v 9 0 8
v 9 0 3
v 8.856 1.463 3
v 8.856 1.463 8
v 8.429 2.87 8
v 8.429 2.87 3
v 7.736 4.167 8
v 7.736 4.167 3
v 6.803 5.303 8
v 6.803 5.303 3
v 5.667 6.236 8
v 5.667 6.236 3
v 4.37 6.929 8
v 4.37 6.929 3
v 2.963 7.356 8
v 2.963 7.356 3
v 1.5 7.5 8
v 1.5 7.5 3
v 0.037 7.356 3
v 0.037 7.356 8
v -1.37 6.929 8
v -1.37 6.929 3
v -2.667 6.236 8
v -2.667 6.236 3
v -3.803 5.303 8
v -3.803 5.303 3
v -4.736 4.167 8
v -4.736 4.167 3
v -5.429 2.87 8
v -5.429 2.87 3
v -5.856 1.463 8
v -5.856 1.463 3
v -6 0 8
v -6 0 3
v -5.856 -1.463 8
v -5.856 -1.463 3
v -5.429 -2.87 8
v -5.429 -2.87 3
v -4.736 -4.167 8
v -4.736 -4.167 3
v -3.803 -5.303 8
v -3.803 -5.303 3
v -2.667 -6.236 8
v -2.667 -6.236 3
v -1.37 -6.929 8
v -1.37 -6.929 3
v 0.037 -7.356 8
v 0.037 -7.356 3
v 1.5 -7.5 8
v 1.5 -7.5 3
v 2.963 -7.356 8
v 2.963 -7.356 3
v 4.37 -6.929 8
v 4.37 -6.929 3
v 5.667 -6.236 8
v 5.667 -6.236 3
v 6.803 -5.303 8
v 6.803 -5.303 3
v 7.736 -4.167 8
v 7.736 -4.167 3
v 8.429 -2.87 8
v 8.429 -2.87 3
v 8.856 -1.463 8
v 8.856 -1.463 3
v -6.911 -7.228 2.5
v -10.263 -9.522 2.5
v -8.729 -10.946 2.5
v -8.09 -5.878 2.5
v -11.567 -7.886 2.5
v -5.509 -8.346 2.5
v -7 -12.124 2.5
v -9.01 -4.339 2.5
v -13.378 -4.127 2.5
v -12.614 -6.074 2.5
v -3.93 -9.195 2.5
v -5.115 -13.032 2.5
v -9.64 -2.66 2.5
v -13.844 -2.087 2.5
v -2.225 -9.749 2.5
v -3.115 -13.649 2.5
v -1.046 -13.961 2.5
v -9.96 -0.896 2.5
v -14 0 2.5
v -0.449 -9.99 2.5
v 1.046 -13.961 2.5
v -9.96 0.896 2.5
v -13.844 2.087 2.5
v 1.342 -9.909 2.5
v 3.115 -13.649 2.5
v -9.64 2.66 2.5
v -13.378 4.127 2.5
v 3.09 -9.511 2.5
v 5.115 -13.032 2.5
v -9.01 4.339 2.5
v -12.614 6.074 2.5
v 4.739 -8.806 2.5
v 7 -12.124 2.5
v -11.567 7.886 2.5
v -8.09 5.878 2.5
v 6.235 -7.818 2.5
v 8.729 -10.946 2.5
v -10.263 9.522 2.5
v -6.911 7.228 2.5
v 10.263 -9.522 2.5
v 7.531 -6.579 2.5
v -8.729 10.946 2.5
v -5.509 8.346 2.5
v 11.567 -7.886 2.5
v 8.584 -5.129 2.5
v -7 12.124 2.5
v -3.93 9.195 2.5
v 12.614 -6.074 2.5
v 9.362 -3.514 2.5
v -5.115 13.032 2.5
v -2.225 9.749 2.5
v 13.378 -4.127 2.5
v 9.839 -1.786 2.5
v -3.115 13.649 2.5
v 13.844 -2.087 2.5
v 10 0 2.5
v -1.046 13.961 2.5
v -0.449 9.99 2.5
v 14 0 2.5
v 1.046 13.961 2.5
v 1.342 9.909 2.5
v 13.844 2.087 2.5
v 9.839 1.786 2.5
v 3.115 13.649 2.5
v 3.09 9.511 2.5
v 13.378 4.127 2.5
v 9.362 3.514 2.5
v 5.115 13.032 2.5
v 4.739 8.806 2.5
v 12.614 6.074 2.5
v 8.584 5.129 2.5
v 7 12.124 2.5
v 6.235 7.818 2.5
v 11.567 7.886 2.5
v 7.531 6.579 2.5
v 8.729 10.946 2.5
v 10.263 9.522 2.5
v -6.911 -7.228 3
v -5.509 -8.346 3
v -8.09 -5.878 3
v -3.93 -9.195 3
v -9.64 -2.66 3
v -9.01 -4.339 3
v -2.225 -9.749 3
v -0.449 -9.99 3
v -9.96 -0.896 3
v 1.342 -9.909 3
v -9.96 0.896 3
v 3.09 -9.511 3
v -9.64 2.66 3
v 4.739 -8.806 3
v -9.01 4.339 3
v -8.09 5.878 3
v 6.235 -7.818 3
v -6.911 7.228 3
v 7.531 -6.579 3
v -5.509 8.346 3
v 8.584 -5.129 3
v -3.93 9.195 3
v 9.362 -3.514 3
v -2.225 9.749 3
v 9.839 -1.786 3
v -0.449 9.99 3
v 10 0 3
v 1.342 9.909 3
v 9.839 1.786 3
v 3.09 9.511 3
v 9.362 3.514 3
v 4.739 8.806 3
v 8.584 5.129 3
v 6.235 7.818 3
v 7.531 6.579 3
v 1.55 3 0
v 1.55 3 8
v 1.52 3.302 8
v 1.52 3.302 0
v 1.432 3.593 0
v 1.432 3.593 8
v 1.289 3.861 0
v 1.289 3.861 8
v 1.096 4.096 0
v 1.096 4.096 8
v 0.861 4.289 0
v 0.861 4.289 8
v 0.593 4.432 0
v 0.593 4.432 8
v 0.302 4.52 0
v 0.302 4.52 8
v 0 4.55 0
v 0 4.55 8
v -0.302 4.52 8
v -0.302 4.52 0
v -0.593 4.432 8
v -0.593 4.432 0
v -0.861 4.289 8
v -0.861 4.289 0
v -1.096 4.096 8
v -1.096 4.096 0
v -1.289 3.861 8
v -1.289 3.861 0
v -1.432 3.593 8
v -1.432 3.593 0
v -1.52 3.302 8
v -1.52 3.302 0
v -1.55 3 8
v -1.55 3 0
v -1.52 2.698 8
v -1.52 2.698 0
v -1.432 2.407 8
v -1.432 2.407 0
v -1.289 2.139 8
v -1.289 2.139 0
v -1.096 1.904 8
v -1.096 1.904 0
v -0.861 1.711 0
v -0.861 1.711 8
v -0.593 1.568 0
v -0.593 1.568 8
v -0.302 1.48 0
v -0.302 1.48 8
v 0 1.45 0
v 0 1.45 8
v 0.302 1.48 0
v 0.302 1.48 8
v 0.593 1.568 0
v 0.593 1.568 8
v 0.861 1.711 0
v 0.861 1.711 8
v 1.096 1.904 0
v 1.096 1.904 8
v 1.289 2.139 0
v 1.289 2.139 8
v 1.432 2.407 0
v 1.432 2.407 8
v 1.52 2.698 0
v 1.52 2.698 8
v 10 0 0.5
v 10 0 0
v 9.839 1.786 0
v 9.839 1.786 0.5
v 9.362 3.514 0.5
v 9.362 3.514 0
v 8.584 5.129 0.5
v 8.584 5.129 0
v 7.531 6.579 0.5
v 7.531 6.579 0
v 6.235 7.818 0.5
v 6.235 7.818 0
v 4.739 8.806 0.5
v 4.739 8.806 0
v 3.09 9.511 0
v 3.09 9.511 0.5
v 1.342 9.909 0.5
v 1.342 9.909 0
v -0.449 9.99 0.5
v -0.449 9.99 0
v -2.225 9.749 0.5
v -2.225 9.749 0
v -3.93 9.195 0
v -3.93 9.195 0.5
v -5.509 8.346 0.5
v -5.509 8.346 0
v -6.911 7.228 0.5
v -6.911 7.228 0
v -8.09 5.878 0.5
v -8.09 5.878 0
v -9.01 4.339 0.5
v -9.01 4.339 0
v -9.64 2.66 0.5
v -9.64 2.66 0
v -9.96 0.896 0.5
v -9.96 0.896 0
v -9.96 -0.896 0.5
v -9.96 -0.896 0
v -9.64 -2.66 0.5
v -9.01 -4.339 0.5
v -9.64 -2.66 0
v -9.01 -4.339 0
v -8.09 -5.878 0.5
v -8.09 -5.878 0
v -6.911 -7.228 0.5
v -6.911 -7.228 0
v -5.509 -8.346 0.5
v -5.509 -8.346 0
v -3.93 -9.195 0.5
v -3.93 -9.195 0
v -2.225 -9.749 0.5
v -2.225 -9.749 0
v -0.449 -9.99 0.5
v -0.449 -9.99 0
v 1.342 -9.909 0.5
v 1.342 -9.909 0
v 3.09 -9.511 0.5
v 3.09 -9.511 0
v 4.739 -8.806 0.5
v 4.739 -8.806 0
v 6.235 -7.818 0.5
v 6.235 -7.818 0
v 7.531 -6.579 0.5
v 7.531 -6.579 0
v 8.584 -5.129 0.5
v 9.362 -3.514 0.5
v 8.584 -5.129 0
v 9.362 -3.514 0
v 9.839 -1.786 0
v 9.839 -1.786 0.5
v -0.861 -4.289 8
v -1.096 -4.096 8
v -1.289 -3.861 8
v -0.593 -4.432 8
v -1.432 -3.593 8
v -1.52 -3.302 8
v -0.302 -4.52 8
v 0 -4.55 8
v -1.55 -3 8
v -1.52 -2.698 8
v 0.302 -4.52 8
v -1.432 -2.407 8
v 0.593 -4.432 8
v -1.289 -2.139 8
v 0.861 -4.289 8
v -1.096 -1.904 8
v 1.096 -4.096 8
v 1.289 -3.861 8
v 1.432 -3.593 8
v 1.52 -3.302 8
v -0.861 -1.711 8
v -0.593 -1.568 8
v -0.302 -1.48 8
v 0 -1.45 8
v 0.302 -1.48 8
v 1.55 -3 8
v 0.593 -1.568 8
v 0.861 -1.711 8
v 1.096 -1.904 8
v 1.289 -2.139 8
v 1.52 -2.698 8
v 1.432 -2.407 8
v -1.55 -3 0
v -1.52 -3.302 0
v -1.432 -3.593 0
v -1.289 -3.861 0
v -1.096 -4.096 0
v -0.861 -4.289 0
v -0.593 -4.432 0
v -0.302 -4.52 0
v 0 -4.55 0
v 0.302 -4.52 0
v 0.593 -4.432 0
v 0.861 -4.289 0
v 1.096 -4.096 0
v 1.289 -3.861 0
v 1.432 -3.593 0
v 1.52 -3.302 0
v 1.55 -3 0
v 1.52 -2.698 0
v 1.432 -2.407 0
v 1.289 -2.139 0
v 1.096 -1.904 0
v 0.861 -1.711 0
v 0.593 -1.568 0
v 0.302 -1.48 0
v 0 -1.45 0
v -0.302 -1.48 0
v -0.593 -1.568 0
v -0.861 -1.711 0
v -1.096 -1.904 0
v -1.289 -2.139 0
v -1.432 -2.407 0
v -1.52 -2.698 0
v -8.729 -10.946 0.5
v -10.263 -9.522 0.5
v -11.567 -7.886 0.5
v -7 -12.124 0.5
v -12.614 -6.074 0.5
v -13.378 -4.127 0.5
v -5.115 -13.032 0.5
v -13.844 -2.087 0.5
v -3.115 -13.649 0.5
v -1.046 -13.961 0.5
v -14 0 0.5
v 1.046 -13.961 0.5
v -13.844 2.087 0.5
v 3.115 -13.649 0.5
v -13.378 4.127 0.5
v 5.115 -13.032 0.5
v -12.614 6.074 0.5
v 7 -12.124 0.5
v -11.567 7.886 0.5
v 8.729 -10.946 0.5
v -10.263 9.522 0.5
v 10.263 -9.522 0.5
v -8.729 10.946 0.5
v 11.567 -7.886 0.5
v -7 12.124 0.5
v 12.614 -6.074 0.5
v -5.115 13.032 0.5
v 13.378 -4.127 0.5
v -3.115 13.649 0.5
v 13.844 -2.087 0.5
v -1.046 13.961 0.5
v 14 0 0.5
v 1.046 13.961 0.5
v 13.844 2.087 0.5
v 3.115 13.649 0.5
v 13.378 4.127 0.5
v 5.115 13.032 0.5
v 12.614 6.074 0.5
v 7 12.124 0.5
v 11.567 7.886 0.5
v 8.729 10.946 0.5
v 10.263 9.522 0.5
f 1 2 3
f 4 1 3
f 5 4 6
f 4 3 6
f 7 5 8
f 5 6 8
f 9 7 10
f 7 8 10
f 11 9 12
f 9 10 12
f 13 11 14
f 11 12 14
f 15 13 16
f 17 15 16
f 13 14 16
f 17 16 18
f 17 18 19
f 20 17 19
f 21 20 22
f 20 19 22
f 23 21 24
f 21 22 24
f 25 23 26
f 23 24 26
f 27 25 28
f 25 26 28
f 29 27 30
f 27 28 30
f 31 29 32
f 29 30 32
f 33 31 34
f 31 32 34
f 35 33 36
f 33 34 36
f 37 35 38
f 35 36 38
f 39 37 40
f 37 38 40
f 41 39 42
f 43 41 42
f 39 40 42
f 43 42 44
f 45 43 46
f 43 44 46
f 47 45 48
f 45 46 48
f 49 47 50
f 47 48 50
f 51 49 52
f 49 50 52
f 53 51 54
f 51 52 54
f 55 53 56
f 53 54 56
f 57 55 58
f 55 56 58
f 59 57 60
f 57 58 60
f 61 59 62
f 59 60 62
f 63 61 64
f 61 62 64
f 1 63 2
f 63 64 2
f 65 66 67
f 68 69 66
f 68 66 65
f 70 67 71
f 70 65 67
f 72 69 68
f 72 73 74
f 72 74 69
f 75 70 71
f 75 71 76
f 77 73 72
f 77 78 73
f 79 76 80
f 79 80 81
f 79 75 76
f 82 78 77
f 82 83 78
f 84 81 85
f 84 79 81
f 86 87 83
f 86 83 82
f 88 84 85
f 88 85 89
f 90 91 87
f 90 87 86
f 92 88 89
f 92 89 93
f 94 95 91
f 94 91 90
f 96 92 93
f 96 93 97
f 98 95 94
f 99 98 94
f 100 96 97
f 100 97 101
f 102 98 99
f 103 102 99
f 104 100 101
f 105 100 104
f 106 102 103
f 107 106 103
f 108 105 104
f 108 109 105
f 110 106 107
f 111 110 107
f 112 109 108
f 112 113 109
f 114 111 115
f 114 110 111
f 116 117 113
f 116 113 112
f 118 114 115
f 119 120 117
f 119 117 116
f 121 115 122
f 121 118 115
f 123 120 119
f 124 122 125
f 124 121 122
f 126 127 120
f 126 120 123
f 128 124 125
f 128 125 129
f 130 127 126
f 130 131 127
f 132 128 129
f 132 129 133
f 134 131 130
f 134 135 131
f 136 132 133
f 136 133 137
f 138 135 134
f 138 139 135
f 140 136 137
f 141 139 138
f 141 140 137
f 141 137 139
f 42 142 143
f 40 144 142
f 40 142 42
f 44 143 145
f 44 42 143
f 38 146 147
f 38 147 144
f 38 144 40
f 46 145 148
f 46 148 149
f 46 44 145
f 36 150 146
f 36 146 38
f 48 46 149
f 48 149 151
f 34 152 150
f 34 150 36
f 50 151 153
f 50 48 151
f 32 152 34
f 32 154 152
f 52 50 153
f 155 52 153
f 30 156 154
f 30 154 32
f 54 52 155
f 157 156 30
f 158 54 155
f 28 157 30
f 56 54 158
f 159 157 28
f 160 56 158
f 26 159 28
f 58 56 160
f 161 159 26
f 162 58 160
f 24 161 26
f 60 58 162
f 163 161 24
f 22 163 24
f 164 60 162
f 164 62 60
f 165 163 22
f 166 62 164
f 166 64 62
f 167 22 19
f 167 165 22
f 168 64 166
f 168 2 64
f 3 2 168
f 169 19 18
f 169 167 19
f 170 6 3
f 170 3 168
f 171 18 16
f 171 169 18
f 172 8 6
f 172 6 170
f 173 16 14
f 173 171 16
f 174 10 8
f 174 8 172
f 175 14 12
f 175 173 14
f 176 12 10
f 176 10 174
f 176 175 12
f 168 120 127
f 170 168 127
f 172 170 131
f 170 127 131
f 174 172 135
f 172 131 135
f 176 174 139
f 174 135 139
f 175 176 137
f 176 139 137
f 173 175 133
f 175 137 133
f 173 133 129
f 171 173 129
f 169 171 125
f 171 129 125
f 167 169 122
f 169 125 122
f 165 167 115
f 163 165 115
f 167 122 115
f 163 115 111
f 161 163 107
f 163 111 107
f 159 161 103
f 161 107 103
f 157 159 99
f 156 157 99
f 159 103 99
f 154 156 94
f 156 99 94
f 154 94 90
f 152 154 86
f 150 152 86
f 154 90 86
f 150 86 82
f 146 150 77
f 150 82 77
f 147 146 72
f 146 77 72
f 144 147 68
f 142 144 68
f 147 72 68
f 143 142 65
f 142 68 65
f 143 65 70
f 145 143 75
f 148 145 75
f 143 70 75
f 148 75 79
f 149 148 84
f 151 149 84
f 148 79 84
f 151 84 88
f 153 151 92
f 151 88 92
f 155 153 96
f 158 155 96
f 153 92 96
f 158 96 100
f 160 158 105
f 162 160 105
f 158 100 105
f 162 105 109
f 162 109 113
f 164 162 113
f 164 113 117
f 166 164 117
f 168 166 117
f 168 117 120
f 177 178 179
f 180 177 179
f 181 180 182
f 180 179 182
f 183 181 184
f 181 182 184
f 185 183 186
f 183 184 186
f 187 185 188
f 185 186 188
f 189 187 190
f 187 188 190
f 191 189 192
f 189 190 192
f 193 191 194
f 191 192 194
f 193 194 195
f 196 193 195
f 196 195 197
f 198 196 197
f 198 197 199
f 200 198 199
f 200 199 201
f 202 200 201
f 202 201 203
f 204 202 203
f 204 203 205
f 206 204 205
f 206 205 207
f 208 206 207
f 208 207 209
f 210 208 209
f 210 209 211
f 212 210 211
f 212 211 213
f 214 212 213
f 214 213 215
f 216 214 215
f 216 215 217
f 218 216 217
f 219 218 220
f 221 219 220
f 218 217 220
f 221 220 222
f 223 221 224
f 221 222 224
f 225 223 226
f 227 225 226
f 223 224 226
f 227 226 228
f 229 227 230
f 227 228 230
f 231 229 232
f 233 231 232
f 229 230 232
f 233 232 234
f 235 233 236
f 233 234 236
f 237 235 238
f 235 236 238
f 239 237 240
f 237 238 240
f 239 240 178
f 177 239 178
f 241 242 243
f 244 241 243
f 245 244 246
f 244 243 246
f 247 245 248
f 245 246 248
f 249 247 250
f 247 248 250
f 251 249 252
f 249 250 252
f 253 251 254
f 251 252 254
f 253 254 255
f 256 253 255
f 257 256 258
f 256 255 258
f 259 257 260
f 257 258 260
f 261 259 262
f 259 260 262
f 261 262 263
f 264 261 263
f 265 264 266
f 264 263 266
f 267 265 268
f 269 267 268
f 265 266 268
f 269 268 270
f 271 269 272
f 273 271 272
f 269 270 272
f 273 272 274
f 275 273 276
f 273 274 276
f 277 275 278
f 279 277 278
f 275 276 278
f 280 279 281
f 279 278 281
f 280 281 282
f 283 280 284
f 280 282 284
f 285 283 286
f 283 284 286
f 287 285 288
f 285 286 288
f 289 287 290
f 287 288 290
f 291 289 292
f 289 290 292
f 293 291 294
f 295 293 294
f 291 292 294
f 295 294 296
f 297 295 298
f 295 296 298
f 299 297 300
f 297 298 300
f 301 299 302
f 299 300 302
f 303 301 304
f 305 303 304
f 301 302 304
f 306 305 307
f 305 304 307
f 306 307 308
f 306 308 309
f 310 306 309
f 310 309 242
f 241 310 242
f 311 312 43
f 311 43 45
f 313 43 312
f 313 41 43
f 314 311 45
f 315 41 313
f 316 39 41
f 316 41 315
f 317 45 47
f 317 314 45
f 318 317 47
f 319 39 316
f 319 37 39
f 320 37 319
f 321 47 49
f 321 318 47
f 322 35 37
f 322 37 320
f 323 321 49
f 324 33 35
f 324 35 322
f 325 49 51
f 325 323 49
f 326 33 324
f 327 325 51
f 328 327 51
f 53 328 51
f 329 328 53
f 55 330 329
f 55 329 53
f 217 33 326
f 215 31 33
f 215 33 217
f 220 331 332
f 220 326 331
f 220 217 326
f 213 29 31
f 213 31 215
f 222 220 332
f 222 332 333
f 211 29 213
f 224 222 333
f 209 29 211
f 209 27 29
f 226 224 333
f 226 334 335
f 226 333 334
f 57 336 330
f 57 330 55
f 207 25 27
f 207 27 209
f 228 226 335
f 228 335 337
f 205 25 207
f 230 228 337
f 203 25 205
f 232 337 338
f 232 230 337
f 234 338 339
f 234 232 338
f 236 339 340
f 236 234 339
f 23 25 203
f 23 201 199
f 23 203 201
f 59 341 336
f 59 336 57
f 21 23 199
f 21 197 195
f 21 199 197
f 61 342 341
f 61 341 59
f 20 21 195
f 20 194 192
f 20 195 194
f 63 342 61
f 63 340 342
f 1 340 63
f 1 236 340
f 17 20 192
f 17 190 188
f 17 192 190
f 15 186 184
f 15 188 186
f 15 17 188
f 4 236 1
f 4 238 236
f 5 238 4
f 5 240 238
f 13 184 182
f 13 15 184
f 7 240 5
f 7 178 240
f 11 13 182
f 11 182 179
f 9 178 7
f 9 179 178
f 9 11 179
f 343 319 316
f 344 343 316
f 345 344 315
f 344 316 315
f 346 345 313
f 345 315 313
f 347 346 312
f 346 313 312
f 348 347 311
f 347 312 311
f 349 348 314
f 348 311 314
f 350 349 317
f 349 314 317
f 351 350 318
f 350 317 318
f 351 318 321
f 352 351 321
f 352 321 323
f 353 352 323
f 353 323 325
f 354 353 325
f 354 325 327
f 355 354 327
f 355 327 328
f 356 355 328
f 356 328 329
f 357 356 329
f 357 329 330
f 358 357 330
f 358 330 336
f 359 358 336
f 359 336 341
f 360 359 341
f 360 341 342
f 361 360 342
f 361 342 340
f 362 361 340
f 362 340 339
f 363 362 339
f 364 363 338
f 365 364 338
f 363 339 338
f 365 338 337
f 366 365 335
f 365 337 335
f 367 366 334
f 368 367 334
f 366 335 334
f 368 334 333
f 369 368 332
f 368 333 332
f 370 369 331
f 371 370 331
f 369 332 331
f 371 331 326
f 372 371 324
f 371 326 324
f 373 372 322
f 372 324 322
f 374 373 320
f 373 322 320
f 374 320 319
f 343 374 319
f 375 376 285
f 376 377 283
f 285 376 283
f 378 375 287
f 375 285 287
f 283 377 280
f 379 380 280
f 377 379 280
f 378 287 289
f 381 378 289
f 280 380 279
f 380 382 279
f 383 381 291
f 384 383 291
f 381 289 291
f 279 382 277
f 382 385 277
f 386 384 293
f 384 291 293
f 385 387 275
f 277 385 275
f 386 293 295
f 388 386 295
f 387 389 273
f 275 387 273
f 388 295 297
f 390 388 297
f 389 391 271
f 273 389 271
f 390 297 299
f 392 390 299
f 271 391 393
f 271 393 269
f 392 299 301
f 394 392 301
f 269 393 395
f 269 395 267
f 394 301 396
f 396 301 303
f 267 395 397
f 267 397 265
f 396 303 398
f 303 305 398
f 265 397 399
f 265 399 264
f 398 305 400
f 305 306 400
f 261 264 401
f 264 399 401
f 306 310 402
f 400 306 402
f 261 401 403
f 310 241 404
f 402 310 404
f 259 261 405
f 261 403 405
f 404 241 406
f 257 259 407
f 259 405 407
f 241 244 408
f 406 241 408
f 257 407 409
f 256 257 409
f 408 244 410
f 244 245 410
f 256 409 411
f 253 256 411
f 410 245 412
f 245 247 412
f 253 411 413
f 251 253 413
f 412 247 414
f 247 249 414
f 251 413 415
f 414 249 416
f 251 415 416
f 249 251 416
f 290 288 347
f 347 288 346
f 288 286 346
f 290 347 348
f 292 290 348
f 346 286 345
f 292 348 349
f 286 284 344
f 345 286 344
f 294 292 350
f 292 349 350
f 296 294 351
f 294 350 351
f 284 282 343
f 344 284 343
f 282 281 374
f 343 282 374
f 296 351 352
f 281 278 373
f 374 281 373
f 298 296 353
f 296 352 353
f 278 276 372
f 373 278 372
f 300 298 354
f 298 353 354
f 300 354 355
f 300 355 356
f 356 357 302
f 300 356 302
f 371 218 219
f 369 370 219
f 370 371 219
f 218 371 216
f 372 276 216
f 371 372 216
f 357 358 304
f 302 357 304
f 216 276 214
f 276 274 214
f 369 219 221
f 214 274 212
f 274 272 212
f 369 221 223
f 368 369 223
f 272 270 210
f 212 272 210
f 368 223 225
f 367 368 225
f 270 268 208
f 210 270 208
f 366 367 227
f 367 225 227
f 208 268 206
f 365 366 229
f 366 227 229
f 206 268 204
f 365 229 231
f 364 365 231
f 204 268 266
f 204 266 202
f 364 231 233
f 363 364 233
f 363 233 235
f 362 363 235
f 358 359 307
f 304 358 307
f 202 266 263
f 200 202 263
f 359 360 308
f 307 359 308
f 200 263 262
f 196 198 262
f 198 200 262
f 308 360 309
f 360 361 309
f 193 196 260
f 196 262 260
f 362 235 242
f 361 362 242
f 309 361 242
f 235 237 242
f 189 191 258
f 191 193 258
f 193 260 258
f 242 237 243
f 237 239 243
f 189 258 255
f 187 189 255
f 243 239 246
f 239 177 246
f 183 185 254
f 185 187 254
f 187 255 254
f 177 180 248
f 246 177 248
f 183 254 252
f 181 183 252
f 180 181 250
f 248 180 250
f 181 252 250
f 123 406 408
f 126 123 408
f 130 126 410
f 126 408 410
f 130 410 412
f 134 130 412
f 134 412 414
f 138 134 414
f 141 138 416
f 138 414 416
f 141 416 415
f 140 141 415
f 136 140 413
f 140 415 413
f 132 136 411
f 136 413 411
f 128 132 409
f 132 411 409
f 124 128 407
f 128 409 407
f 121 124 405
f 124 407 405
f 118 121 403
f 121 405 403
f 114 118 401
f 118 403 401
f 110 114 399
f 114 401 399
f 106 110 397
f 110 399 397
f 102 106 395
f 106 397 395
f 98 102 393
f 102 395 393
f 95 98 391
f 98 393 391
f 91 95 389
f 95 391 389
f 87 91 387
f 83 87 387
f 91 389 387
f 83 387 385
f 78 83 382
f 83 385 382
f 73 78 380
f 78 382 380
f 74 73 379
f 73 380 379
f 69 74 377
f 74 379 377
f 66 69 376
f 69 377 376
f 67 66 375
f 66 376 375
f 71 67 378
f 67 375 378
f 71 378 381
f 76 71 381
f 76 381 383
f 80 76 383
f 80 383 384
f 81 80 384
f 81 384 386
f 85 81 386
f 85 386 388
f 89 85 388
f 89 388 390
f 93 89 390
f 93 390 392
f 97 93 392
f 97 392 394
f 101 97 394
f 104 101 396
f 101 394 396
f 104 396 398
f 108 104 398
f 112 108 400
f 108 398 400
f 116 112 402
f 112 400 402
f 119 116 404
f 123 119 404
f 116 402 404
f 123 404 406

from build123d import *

# Parameters (mm, degrees)
SKETCH1_R           = 10
BOSS_EXTRUDE1_DEPTH = 0.5
SKETCH4_R           = 14
BOSS_EXTRUDE3_DEPTH = 2
SKETCH5_R           = 10
BOSS_EXTRUDE4_DEPTH = 0.5
SKETCH6_R           = 7.5
BOSS_EXTRUDE6_DEPTH = 5
SKETCH7_R           = 1.55
CUT_EXTRUDE1_DEPTH  = 22.354156504


with BuildPart() as part:
    # Sketch1 → Boss-Extrude1 (new body)
    with BuildSketch(Plane.XY):
        Circle(SKETCH1_R)
    extrude(amount=BOSS_EXTRUDE1_DEPTH)

    # Sketch4 → Boss-Extrude3 (add)
    with BuildSketch(Plane.XY.offset(0.5)):
        Circle(SKETCH4_R)
    extrude(amount=BOSS_EXTRUDE3_DEPTH)

    # Sketch5 → Boss-Extrude4 (add)
    with BuildSketch(Plane.XY.offset(2.5)):
        Circle(SKETCH5_R)
    extrude(amount=BOSS_EXTRUDE4_DEPTH)

    # Sketch6 → Boss-Extrude6 (add)
    with BuildSketch(Plane.XY.offset(3)):
        with Locations((1.5, 0)):
            Circle(SKETCH6_R)
    extrude(amount=BOSS_EXTRUDE6_DEPTH)

    # Sketch7 → Cut-Extrude1 (cut, through all)
    with BuildSketch(Plane.XY.offset(8)):
        with Locations((0, 3)):
            Circle(SKETCH7_R)
        with Locations(Location((0, -3, 0), (0, 0, 180))):
            Circle(SKETCH7_R)
    extrude(amount=-CUT_EXTRUDE1_DEPTH, mode=Mode.SUBTRACT)


solid = part.part
